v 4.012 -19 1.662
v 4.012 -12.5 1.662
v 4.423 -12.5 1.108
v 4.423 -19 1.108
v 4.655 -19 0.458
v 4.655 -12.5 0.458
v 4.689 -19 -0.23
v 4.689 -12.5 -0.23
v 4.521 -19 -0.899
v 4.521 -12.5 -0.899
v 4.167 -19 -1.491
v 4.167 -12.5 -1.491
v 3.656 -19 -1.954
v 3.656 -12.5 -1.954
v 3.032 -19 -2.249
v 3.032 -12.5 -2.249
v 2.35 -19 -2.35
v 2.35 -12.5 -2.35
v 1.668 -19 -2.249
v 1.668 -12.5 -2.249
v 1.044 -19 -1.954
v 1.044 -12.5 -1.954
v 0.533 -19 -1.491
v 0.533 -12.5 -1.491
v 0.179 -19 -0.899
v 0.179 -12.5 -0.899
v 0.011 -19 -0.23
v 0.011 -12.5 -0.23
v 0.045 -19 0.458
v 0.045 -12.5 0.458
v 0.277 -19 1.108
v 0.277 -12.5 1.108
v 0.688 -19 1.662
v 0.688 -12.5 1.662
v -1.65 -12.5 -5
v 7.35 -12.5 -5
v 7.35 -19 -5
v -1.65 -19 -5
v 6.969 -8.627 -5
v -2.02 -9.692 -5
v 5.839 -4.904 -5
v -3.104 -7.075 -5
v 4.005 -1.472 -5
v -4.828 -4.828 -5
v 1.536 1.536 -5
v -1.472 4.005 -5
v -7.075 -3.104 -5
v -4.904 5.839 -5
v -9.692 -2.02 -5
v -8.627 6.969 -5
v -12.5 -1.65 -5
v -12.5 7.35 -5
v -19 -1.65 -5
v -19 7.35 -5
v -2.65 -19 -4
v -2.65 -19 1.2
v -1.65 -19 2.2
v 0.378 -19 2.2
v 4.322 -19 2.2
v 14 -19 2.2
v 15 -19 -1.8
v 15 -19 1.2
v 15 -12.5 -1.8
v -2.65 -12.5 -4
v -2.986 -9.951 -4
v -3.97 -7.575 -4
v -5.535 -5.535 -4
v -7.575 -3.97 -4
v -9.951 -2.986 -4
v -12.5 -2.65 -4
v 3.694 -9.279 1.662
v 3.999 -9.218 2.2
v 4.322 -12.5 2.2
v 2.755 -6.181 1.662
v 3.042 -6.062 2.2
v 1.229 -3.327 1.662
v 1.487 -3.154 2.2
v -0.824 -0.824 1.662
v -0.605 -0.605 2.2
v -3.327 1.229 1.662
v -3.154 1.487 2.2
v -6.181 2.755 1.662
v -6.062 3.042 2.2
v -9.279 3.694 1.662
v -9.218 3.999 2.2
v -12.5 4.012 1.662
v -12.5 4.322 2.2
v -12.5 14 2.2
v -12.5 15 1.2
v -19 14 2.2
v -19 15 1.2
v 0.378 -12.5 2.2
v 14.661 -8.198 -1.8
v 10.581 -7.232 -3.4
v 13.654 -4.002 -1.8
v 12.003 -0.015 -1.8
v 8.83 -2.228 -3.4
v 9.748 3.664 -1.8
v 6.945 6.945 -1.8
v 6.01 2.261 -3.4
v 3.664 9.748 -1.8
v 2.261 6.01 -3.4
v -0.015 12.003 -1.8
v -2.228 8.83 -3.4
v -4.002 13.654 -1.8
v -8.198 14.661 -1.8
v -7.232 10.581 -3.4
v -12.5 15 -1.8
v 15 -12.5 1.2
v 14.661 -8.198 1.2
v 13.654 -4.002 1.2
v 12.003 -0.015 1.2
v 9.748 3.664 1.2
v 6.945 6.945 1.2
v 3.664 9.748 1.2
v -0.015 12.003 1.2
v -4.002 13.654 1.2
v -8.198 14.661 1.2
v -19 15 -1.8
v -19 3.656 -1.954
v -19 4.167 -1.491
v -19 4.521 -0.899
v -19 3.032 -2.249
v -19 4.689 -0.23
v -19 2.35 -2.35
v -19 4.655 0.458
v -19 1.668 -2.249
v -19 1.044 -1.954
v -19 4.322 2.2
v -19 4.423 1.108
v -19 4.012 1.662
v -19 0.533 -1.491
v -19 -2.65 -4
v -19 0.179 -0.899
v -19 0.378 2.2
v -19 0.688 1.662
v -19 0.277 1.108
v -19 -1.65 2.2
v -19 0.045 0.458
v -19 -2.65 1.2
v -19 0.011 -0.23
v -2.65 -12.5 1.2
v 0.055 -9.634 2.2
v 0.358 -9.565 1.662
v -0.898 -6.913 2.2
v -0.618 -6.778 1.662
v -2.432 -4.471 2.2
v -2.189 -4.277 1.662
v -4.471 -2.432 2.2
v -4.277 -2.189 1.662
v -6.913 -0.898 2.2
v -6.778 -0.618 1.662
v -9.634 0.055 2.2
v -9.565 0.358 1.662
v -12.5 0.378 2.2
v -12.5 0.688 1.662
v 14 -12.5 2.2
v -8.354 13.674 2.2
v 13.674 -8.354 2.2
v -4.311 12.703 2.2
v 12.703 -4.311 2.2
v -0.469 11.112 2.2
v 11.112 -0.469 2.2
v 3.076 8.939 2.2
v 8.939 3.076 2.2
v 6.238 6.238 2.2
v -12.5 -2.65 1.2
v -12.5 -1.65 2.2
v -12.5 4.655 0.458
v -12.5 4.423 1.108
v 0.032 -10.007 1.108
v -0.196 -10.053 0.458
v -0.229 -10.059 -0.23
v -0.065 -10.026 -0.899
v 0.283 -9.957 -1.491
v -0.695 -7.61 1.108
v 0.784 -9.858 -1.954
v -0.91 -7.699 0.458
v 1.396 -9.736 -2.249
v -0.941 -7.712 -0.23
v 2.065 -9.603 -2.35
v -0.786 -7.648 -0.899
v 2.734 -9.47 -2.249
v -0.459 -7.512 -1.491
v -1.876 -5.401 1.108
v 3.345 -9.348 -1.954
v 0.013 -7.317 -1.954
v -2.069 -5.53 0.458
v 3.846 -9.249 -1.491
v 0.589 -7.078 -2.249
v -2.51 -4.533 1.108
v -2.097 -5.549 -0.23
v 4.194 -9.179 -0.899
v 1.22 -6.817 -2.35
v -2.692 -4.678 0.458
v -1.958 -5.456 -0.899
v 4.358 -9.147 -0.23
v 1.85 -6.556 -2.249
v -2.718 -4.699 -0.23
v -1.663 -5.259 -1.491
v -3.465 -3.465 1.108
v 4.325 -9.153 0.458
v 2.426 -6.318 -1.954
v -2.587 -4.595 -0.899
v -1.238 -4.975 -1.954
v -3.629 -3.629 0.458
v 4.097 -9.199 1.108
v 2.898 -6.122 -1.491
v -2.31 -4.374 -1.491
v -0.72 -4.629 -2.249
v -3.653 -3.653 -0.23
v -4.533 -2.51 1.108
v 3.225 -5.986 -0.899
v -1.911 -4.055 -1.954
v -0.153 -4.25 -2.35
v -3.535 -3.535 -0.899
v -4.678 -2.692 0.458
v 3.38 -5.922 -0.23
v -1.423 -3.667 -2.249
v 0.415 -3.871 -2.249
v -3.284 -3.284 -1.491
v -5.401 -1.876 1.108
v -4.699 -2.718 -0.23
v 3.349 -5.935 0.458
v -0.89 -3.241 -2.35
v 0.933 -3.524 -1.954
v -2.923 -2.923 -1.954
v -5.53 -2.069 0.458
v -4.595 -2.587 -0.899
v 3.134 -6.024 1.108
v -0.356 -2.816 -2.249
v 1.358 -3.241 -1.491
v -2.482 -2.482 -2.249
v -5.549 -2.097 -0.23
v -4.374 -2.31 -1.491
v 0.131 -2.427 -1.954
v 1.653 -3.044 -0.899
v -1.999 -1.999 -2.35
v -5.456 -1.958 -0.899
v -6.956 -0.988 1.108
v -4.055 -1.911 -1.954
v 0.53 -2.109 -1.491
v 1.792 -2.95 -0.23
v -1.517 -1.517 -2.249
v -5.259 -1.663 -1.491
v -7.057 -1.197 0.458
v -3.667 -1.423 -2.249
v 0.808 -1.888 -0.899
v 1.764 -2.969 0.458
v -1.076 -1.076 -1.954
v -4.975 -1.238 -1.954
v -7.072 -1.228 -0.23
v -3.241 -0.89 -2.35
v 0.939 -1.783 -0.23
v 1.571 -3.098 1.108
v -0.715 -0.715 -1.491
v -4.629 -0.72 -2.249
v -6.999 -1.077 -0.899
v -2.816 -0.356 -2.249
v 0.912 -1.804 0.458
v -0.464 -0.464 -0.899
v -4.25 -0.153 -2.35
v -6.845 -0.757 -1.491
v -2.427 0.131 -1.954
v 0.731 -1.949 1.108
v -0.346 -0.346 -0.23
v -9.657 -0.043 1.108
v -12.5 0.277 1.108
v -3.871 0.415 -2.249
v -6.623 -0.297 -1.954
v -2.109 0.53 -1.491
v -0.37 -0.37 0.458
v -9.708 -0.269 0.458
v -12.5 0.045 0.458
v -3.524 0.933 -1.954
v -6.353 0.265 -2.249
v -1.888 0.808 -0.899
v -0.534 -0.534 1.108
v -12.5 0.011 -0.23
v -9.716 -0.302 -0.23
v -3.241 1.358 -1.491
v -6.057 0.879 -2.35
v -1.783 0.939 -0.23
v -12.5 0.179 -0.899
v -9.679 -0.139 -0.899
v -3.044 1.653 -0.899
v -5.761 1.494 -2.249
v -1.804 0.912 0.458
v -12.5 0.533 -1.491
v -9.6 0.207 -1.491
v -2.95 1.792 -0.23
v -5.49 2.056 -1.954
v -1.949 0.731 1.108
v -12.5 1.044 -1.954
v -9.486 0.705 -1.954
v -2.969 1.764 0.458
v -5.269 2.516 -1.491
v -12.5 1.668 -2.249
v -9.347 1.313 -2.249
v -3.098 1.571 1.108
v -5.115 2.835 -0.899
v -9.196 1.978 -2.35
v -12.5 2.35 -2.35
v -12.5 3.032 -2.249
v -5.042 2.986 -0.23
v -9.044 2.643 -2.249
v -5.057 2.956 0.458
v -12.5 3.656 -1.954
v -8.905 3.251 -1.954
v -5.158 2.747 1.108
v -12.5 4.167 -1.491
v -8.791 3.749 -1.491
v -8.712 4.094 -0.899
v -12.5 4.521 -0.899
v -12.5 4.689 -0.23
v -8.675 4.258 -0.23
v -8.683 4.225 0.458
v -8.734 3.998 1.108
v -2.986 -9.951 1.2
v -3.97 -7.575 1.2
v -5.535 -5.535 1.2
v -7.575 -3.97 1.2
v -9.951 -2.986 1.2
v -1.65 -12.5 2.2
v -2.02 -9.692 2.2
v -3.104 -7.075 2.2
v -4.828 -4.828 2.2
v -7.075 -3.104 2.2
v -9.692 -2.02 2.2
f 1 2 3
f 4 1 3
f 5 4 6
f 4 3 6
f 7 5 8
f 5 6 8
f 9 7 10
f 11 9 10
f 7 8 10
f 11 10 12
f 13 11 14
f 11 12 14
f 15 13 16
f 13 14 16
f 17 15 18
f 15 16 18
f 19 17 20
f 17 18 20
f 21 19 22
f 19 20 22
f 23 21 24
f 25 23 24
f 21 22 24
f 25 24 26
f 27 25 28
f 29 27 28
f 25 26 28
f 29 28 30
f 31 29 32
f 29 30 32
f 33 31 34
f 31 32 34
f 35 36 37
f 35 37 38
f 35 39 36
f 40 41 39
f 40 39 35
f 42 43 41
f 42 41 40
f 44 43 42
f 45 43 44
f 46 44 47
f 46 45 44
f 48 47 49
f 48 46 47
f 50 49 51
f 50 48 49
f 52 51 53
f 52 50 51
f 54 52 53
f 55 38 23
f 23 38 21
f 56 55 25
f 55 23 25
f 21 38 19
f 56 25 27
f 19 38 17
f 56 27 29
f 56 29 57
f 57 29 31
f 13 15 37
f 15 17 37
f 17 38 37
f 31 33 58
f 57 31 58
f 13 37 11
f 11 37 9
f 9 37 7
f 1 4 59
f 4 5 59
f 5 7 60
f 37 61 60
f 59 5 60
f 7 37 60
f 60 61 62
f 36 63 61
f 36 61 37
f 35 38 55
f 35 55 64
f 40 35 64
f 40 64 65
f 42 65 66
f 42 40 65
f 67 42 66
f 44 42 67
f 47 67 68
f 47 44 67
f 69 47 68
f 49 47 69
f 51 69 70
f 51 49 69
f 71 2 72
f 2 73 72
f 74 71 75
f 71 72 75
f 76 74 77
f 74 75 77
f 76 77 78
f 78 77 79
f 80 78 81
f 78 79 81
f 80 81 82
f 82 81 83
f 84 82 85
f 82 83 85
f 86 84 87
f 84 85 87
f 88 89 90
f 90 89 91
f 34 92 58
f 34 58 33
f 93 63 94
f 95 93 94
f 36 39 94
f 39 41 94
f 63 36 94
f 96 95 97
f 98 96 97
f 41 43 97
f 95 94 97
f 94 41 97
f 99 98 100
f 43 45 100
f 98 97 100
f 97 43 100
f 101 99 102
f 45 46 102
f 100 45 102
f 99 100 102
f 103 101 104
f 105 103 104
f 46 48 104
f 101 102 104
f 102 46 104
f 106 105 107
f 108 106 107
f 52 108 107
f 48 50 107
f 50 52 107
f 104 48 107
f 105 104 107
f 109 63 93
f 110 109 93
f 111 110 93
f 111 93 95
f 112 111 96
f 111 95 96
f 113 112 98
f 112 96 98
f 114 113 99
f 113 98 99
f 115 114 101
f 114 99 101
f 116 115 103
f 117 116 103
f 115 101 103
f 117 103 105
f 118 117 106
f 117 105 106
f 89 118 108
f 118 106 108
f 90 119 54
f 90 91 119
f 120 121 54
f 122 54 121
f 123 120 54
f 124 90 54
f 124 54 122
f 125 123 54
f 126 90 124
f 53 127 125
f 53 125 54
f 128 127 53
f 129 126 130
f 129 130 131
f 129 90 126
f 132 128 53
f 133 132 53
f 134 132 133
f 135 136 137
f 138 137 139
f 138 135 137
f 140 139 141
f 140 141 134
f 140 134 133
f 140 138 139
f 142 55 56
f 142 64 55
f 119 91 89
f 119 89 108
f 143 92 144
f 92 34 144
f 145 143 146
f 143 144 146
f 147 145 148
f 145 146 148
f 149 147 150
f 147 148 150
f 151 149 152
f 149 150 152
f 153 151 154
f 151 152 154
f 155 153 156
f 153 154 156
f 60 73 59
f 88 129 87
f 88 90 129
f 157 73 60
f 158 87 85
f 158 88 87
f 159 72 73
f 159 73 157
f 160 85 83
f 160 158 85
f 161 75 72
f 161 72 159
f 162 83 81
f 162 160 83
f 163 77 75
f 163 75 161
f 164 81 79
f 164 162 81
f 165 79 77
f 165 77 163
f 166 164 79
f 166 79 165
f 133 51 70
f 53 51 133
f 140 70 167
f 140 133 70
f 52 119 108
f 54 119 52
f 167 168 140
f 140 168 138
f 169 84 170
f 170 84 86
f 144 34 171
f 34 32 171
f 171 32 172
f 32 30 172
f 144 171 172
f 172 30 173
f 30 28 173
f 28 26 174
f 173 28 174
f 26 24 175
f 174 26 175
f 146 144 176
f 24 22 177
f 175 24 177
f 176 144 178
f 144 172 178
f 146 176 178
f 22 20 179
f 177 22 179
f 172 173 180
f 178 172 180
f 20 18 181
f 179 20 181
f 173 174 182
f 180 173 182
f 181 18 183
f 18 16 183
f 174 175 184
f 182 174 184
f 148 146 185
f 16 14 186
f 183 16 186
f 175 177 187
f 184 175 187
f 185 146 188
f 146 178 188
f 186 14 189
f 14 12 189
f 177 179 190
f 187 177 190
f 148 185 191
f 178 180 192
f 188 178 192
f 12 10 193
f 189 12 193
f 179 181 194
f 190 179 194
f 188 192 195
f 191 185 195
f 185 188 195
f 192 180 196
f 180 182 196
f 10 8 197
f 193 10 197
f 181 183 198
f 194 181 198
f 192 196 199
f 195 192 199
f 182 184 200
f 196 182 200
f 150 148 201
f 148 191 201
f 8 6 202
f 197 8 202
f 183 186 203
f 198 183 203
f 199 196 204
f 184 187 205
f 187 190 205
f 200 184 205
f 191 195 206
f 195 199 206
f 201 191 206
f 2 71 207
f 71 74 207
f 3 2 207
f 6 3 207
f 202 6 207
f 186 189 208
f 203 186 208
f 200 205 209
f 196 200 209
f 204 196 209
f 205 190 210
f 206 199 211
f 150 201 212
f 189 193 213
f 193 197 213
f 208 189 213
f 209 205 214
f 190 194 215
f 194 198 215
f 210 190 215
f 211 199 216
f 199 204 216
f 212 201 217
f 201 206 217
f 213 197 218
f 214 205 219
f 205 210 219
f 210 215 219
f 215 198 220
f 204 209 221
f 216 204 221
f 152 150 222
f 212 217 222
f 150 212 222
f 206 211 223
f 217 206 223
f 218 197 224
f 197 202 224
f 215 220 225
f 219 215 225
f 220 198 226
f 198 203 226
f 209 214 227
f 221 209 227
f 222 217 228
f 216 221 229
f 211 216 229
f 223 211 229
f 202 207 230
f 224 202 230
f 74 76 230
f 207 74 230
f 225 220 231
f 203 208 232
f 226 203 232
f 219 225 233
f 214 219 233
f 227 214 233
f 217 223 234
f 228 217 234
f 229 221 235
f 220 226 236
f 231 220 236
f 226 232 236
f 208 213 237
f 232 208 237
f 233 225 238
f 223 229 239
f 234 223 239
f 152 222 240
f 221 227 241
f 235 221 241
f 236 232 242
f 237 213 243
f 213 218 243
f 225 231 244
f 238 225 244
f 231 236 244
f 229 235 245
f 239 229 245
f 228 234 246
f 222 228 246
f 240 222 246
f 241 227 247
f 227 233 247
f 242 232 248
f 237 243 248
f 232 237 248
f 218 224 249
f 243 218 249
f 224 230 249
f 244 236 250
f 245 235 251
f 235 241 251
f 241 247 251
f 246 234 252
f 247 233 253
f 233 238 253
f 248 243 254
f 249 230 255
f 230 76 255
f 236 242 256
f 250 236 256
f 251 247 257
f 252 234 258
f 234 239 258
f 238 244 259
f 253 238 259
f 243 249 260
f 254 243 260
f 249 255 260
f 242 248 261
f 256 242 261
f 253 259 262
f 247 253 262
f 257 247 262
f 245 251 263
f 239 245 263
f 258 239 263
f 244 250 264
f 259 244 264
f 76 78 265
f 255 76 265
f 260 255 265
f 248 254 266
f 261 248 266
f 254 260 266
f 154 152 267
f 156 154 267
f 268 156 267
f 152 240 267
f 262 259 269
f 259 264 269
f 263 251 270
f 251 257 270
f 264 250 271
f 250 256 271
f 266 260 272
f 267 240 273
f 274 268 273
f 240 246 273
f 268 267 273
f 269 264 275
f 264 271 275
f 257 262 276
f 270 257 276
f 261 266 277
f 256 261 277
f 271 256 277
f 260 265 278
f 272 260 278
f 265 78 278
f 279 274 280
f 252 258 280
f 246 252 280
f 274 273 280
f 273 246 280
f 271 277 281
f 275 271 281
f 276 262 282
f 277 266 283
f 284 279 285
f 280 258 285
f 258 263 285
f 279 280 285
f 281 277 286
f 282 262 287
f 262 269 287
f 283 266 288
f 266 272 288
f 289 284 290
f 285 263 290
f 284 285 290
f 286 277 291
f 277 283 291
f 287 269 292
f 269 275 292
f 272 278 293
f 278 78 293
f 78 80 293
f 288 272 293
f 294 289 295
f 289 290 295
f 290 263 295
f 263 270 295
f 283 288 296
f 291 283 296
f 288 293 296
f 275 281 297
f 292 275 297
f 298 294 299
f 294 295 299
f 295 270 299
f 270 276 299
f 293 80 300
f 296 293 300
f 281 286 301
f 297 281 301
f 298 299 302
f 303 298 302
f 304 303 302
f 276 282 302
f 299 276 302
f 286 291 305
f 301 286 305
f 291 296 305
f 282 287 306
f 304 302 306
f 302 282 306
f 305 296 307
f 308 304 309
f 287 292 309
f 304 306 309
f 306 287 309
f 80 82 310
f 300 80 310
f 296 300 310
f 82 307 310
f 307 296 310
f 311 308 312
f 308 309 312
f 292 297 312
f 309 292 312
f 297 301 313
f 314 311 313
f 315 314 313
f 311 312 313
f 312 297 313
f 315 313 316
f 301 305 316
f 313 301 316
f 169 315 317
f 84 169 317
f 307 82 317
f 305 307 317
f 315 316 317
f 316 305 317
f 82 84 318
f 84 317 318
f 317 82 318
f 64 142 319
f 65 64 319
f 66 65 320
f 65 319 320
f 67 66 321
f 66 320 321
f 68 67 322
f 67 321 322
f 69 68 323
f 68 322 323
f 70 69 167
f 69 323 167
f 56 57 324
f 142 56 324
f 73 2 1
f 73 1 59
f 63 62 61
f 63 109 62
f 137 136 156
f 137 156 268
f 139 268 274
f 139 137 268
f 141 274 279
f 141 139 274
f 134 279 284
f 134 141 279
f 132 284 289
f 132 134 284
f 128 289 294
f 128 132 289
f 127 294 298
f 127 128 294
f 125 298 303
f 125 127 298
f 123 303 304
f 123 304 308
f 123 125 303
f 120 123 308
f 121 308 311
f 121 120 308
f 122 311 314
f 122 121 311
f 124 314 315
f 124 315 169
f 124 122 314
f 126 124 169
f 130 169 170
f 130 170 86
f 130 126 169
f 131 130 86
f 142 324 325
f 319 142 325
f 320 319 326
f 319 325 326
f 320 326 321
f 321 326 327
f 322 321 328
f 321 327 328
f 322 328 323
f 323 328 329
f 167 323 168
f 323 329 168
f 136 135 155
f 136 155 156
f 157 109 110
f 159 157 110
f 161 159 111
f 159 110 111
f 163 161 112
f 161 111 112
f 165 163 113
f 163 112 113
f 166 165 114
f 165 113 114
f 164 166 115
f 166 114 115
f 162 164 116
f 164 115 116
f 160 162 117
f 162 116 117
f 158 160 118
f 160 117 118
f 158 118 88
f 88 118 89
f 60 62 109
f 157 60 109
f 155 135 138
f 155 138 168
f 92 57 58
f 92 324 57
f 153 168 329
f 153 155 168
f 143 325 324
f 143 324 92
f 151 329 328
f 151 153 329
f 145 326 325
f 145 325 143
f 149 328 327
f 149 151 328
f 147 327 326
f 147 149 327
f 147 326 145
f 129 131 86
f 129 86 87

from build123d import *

# Parameters (mm, degrees)
CHAMFER_SIZE = 1


with BuildPart() as part:
    # AdditivePipe: sweep along a path in Sketch
    with BuildLine(Plane.XY) as additivepipe_path:
        Line((0, -19), (0, -12.5))
        ThreePointArc((0, -12.5), (-3.661165, -3.661165), (-12.5, 0))
        Line((-12.5, 0), (-19, 0))
    # Sketch001 → AdditivePipe (sweep)
    with BuildSketch(Plane(origin=(0, -19, 0), x_dir=(-1, 0, 0), z_dir=(0, 1, 0))):
        with BuildLine():
            Line((2.65, 2.2), (2.65, -5))
            Line((2.65, -5), (-7.35, -5))
            Line((-15, -1.8), (-7.35, -5))
            Line((-15, -1.8), (-15, 2.2))
            Line((-4.322488, 2.2), (-15, 2.2))
            Line((-4.322488, 2.2), (-4.011701, 1.661701))
            ThreePointArc((-4.011701, 1.661701), (-2.35, -2.35), (-0.688299, 1.661701))
            Line((-0.377512, 2.2), (-0.688299, 1.661701))
            Line((2.65, 2.2), (-0.377512, 2.2))
        make_face()
    sweep(path=additivepipe_path.line)

    # Chamfer
    chamfer_edges = [part.edges().sort_by_distance(p)[0] for p in [
        (-2.65, -15.75, -5),
        (-2.65, -15.75, 2.2),
        (15, -15.75, 2.2),
    ]]
    chamfer(chamfer_edges, length=CHAMFER_SIZE)


solid = part.part
